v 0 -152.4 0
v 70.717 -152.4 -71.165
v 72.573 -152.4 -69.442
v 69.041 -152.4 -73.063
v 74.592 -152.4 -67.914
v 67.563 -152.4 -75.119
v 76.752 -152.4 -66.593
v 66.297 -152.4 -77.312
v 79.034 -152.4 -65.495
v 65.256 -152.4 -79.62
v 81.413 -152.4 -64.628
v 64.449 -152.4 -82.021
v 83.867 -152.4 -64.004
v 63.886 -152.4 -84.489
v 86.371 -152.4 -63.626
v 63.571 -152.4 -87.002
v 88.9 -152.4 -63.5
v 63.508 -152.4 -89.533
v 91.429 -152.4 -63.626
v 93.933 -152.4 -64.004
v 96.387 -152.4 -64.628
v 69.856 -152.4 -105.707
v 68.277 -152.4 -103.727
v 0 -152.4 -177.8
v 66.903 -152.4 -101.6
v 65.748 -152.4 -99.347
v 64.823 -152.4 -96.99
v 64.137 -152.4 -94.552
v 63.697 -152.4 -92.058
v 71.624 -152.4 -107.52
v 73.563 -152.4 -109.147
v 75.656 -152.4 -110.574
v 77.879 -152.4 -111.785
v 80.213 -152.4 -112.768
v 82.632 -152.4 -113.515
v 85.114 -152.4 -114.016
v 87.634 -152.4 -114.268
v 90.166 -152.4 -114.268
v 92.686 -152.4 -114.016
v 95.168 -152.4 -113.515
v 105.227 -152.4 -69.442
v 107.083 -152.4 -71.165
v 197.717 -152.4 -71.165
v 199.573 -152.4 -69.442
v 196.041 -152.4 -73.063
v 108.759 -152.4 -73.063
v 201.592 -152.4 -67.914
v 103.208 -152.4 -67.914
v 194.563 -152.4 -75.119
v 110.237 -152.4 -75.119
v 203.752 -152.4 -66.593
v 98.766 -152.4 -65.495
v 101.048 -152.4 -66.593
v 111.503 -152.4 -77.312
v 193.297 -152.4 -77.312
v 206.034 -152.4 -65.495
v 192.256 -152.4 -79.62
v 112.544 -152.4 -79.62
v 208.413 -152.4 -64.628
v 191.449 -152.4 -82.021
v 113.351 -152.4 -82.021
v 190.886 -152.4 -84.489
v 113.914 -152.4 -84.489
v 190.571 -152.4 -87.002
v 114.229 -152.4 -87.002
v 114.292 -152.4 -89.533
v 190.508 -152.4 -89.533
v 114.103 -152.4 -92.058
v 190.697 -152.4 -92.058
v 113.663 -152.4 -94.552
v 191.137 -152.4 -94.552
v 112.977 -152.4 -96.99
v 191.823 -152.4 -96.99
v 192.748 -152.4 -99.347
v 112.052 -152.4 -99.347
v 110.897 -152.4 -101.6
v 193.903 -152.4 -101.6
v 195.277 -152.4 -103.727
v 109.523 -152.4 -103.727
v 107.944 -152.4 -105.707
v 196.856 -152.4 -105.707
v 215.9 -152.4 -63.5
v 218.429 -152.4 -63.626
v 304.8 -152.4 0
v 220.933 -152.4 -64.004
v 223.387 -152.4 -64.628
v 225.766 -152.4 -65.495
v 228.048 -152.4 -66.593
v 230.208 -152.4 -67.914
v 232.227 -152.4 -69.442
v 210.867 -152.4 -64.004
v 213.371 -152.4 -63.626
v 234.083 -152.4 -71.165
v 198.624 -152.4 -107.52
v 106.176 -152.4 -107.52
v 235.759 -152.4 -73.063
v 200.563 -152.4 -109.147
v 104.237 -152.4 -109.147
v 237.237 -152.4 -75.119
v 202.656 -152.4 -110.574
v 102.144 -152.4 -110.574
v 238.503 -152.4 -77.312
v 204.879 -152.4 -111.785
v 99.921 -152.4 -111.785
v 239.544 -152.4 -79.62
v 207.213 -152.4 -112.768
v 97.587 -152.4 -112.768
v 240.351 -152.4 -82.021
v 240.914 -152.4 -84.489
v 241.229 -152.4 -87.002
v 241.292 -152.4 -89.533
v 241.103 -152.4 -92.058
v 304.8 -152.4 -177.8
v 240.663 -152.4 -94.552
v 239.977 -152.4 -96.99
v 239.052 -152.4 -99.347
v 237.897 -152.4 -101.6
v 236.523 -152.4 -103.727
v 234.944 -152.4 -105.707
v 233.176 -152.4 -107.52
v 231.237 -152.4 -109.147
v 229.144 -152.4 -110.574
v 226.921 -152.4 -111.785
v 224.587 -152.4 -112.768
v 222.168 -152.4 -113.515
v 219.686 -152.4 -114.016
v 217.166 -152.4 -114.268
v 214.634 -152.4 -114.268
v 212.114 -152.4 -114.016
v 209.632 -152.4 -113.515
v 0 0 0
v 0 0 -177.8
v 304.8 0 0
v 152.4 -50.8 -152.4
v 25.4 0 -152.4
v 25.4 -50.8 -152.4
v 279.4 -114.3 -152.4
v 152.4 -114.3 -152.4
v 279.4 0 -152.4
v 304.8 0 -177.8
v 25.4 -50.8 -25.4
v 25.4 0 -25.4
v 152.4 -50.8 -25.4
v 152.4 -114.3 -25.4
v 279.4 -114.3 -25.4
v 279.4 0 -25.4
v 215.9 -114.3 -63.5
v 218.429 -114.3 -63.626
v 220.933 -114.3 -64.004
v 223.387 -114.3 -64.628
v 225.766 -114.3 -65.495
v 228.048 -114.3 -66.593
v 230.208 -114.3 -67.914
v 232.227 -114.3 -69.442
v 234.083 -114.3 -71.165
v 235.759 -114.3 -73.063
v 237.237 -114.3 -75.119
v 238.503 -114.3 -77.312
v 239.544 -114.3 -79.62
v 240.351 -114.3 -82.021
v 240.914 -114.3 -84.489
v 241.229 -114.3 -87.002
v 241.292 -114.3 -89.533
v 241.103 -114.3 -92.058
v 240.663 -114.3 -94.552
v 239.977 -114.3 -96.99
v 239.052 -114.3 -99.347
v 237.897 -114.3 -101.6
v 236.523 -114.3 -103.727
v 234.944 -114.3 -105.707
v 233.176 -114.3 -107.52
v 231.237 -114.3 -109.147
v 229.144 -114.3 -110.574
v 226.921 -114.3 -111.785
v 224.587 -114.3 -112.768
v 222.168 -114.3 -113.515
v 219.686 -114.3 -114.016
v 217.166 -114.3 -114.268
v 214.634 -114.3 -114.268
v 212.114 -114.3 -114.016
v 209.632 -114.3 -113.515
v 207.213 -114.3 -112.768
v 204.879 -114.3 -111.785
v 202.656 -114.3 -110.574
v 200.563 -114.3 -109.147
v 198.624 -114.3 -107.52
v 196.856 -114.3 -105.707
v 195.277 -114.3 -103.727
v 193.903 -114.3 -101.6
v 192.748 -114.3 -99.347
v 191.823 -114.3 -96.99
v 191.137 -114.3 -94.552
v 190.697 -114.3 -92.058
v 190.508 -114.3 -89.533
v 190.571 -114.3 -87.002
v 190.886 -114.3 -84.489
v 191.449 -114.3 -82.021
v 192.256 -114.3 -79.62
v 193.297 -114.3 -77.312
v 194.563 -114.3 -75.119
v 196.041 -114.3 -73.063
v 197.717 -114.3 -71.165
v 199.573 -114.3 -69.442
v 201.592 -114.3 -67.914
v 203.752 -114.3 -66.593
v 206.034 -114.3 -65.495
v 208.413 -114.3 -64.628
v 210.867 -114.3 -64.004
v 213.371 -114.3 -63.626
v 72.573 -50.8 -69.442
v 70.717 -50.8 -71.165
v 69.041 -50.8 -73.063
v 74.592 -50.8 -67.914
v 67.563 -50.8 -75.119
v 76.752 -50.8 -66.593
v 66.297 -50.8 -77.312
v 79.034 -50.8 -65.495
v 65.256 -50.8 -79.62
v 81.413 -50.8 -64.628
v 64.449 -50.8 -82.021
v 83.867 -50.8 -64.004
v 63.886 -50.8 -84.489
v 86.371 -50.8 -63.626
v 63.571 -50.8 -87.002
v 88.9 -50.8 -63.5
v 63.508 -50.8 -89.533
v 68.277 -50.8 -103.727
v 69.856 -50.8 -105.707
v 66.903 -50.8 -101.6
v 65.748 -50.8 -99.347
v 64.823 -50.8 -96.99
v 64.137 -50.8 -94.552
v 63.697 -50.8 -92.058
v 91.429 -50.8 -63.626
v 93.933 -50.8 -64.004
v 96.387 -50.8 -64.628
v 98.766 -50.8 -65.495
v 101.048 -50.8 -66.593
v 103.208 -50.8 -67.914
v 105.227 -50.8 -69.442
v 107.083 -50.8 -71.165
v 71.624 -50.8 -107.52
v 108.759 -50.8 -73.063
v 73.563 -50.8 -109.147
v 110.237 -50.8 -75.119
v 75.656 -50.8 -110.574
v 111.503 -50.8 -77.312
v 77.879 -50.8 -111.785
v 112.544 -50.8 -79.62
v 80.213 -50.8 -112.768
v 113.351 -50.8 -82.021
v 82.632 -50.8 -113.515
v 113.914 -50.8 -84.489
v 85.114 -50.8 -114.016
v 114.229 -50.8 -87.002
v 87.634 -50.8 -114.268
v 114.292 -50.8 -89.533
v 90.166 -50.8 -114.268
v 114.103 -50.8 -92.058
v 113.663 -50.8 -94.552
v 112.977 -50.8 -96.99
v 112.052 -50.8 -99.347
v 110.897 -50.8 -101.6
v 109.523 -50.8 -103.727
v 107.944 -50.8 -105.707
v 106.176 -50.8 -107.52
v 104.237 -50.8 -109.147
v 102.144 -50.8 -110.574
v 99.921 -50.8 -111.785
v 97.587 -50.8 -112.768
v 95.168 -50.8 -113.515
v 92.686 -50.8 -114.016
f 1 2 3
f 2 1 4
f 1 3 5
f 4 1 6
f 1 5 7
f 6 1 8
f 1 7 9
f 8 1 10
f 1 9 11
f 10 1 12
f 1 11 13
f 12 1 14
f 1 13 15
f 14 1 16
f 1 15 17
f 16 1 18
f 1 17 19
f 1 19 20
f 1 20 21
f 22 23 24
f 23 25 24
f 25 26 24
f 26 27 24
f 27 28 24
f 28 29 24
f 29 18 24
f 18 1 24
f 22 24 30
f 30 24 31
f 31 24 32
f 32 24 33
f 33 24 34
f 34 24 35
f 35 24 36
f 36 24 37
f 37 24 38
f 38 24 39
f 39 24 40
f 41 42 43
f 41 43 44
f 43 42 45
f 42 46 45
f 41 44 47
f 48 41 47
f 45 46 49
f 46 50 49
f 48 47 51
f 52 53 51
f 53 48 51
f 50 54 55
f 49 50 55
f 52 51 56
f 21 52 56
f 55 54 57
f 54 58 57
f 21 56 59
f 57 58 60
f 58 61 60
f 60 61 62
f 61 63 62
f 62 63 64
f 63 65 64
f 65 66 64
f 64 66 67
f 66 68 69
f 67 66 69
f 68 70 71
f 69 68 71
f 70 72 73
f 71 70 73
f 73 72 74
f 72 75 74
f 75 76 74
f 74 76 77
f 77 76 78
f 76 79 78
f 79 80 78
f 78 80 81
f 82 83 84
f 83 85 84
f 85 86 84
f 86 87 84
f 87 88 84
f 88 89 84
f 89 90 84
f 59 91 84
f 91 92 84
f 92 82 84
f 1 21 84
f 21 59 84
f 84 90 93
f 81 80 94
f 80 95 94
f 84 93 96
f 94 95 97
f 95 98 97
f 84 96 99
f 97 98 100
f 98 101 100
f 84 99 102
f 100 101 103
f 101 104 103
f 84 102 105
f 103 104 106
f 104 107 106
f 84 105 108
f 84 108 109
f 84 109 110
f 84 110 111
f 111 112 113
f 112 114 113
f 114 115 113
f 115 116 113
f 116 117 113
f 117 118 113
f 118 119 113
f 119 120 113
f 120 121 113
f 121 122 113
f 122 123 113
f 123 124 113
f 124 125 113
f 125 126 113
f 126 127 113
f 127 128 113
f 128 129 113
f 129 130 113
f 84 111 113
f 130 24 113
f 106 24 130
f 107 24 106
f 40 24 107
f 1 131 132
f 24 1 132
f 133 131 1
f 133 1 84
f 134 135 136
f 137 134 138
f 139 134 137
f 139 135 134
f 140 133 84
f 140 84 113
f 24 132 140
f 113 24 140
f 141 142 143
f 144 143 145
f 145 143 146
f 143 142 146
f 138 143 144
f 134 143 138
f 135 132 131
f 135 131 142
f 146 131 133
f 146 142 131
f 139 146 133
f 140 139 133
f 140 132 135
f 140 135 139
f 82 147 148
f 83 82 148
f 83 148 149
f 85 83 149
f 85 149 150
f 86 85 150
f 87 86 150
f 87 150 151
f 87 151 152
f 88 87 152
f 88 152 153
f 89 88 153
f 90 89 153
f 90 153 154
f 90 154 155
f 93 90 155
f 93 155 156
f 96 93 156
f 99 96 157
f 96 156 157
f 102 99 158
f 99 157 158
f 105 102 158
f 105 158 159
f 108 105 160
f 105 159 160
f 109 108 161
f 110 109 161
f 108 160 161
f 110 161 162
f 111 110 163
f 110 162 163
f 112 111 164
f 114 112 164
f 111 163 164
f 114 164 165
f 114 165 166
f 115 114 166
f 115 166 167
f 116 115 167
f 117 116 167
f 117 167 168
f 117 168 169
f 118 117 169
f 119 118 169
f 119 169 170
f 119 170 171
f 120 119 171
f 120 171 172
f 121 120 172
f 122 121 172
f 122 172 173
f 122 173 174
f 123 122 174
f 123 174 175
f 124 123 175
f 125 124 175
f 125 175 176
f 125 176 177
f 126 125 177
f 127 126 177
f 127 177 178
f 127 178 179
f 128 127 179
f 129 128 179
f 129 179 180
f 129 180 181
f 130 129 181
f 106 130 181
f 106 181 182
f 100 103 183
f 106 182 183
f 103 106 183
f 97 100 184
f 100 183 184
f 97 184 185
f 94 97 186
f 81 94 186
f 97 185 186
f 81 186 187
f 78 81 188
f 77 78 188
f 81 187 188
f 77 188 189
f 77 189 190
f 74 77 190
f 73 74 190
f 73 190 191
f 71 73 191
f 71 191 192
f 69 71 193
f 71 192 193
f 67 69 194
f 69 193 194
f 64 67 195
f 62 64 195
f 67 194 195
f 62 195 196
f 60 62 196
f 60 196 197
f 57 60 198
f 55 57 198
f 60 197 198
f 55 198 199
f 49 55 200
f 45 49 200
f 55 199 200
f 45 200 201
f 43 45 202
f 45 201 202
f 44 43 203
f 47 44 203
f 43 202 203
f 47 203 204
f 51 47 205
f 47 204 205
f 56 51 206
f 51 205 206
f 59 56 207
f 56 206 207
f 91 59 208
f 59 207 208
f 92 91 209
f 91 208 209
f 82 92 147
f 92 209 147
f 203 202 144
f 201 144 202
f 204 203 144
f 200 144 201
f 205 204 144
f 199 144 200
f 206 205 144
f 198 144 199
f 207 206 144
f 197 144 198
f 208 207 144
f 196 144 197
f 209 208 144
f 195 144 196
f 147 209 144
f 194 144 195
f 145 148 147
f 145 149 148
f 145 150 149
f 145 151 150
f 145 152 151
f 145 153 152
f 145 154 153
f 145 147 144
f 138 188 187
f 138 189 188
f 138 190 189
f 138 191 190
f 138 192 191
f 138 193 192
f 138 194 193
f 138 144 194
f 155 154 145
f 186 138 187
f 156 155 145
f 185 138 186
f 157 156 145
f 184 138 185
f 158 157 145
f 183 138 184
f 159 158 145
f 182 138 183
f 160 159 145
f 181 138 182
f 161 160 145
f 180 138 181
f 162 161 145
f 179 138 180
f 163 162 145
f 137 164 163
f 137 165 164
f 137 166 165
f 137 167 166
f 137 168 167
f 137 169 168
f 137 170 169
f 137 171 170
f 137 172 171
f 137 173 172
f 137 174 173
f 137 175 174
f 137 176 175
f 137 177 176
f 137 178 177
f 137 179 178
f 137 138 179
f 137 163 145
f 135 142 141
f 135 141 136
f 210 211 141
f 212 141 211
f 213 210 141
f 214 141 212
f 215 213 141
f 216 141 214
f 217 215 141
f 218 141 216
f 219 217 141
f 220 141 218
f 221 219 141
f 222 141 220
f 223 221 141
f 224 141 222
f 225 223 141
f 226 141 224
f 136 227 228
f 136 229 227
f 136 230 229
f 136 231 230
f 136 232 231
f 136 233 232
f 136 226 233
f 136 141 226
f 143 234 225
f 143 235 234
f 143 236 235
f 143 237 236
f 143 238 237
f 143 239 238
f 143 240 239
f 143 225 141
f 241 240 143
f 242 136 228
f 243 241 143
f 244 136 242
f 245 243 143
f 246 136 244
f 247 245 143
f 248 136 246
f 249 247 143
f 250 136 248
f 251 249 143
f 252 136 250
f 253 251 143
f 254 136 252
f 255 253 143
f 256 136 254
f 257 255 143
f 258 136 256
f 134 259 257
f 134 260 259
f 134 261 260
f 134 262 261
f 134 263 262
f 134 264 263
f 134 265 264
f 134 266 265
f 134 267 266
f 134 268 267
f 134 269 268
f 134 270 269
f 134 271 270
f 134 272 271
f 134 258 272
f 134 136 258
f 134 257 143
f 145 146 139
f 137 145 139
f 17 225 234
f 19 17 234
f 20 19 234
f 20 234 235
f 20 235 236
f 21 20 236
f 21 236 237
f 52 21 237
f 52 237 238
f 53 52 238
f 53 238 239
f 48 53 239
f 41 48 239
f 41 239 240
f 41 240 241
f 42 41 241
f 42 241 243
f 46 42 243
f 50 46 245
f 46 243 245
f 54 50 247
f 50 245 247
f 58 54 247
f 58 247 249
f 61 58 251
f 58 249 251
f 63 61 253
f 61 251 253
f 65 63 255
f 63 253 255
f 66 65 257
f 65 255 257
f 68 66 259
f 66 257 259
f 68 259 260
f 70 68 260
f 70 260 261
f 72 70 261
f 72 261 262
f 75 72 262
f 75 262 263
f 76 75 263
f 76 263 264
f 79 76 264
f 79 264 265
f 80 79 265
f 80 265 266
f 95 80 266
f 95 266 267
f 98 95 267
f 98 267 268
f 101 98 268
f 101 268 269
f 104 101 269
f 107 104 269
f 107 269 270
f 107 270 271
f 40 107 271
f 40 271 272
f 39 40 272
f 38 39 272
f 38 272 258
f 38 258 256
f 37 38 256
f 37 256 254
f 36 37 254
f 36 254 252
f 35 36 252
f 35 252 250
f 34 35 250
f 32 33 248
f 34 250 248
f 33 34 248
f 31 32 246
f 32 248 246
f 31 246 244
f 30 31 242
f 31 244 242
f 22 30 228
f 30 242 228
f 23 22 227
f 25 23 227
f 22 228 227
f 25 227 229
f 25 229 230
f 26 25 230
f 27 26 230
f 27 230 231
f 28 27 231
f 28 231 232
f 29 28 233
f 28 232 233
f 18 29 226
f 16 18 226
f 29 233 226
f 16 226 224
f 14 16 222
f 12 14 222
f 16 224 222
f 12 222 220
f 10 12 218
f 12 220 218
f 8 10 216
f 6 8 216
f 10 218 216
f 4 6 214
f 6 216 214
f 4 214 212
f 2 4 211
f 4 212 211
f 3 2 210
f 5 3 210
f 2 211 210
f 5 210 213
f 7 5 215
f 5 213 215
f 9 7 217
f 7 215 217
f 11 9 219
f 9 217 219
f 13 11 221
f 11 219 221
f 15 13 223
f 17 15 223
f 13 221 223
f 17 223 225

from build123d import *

# Parameters (mm, degrees)
SKETCH1_W           = 304.8
SKETCH1_H           = 177.8
SKETCH1_W_2         = 254
SKETCH1_H_2         = 127
BOSS_EXTRUDE2_DEPTH = 152.4
SKETCH4_W           = 127
SKETCH4_H           = 127
SKETCH4_R           = 25.4
BOSS_EXTRUDE3_DEPTH = 152.4
SKETCH5_W           = 127
SKETCH5_H           = 127
CUT_EXTRUDE1_DEPTH  = 50.8
SKETCH10_W          = 127
SKETCH10_H          = 127
CUT_EXTRUDE2_DEPTH  = 114.3


with BuildPart() as part:
    # Sketch1 → Boss-Extrude2 (new body)
    with BuildSketch(Plane(origin=(0, 0, 0), x_dir=(1, 0, 0), z_dir=(0, 1, 0))):
        with Locations((152.4, 88.9)):
            Rectangle(SKETCH1_W, SKETCH1_H)
        with Locations((152.4, 88.9)):
            Rectangle(SKETCH1_W_2, SKETCH1_H_2, mode=Mode.SUBTRACT)
    extrude(amount=-BOSS_EXTRUDE2_DEPTH)

    # Sketch4 → Boss-Extrude3 (add)
    # profile 1 of 2: a face of its own
    with BuildSketch(Plane(origin=(0, 0, 0), x_dir=(1, 0, 0), z_dir=(0, 1, 0))):
        with Locations((215.9, 88.9)):
            Rectangle(SKETCH4_W, SKETCH4_H)
        with Locations(Location((215.9, 88.9, 0), (0, 0, 270))):
            Circle(SKETCH4_R, mode=Mode.SUBTRACT)
    # profile 2 of 2: a face of its own
    with BuildSketch(Plane(origin=(0, 0, 0), x_dir=(1, 0, 0), z_dir=(0, 1, 0))):
        with Locations((88.9, 88.9)):
            Rectangle(SKETCH4_W, SKETCH4_H)
        with Locations(Location((88.9, 88.9, 0), (0, 0, 270))):
            Circle(SKETCH4_R, mode=Mode.SUBTRACT)
    extrude(amount=-BOSS_EXTRUDE3_DEPTH)

    # Sketch5 → Cut-Extrude1 (cut)
    with BuildSketch(Plane(origin=(0, 0, 0), x_dir=(1, 0, 0), z_dir=(0, 1, 0))):
        with Locations((88.9, 88.9)):
            Rectangle(SKETCH5_W, SKETCH5_H)
    extrude(amount=-CUT_EXTRUDE1_DEPTH, mode=Mode.SUBTRACT)

    # Sketch10 → Cut-Extrude2 (cut)
    with BuildSketch(Plane(origin=(0, 0, 0), x_dir=(1, 0, 0), z_dir=(0, 1, 0))):
        with Locations((215.9, 88.9)):
            Rectangle(SKETCH10_W, SKETCH10_H)
    extrude(amount=-CUT_EXTRUDE2_DEPTH, mode=Mode.SUBTRACT)


solid = part.part
